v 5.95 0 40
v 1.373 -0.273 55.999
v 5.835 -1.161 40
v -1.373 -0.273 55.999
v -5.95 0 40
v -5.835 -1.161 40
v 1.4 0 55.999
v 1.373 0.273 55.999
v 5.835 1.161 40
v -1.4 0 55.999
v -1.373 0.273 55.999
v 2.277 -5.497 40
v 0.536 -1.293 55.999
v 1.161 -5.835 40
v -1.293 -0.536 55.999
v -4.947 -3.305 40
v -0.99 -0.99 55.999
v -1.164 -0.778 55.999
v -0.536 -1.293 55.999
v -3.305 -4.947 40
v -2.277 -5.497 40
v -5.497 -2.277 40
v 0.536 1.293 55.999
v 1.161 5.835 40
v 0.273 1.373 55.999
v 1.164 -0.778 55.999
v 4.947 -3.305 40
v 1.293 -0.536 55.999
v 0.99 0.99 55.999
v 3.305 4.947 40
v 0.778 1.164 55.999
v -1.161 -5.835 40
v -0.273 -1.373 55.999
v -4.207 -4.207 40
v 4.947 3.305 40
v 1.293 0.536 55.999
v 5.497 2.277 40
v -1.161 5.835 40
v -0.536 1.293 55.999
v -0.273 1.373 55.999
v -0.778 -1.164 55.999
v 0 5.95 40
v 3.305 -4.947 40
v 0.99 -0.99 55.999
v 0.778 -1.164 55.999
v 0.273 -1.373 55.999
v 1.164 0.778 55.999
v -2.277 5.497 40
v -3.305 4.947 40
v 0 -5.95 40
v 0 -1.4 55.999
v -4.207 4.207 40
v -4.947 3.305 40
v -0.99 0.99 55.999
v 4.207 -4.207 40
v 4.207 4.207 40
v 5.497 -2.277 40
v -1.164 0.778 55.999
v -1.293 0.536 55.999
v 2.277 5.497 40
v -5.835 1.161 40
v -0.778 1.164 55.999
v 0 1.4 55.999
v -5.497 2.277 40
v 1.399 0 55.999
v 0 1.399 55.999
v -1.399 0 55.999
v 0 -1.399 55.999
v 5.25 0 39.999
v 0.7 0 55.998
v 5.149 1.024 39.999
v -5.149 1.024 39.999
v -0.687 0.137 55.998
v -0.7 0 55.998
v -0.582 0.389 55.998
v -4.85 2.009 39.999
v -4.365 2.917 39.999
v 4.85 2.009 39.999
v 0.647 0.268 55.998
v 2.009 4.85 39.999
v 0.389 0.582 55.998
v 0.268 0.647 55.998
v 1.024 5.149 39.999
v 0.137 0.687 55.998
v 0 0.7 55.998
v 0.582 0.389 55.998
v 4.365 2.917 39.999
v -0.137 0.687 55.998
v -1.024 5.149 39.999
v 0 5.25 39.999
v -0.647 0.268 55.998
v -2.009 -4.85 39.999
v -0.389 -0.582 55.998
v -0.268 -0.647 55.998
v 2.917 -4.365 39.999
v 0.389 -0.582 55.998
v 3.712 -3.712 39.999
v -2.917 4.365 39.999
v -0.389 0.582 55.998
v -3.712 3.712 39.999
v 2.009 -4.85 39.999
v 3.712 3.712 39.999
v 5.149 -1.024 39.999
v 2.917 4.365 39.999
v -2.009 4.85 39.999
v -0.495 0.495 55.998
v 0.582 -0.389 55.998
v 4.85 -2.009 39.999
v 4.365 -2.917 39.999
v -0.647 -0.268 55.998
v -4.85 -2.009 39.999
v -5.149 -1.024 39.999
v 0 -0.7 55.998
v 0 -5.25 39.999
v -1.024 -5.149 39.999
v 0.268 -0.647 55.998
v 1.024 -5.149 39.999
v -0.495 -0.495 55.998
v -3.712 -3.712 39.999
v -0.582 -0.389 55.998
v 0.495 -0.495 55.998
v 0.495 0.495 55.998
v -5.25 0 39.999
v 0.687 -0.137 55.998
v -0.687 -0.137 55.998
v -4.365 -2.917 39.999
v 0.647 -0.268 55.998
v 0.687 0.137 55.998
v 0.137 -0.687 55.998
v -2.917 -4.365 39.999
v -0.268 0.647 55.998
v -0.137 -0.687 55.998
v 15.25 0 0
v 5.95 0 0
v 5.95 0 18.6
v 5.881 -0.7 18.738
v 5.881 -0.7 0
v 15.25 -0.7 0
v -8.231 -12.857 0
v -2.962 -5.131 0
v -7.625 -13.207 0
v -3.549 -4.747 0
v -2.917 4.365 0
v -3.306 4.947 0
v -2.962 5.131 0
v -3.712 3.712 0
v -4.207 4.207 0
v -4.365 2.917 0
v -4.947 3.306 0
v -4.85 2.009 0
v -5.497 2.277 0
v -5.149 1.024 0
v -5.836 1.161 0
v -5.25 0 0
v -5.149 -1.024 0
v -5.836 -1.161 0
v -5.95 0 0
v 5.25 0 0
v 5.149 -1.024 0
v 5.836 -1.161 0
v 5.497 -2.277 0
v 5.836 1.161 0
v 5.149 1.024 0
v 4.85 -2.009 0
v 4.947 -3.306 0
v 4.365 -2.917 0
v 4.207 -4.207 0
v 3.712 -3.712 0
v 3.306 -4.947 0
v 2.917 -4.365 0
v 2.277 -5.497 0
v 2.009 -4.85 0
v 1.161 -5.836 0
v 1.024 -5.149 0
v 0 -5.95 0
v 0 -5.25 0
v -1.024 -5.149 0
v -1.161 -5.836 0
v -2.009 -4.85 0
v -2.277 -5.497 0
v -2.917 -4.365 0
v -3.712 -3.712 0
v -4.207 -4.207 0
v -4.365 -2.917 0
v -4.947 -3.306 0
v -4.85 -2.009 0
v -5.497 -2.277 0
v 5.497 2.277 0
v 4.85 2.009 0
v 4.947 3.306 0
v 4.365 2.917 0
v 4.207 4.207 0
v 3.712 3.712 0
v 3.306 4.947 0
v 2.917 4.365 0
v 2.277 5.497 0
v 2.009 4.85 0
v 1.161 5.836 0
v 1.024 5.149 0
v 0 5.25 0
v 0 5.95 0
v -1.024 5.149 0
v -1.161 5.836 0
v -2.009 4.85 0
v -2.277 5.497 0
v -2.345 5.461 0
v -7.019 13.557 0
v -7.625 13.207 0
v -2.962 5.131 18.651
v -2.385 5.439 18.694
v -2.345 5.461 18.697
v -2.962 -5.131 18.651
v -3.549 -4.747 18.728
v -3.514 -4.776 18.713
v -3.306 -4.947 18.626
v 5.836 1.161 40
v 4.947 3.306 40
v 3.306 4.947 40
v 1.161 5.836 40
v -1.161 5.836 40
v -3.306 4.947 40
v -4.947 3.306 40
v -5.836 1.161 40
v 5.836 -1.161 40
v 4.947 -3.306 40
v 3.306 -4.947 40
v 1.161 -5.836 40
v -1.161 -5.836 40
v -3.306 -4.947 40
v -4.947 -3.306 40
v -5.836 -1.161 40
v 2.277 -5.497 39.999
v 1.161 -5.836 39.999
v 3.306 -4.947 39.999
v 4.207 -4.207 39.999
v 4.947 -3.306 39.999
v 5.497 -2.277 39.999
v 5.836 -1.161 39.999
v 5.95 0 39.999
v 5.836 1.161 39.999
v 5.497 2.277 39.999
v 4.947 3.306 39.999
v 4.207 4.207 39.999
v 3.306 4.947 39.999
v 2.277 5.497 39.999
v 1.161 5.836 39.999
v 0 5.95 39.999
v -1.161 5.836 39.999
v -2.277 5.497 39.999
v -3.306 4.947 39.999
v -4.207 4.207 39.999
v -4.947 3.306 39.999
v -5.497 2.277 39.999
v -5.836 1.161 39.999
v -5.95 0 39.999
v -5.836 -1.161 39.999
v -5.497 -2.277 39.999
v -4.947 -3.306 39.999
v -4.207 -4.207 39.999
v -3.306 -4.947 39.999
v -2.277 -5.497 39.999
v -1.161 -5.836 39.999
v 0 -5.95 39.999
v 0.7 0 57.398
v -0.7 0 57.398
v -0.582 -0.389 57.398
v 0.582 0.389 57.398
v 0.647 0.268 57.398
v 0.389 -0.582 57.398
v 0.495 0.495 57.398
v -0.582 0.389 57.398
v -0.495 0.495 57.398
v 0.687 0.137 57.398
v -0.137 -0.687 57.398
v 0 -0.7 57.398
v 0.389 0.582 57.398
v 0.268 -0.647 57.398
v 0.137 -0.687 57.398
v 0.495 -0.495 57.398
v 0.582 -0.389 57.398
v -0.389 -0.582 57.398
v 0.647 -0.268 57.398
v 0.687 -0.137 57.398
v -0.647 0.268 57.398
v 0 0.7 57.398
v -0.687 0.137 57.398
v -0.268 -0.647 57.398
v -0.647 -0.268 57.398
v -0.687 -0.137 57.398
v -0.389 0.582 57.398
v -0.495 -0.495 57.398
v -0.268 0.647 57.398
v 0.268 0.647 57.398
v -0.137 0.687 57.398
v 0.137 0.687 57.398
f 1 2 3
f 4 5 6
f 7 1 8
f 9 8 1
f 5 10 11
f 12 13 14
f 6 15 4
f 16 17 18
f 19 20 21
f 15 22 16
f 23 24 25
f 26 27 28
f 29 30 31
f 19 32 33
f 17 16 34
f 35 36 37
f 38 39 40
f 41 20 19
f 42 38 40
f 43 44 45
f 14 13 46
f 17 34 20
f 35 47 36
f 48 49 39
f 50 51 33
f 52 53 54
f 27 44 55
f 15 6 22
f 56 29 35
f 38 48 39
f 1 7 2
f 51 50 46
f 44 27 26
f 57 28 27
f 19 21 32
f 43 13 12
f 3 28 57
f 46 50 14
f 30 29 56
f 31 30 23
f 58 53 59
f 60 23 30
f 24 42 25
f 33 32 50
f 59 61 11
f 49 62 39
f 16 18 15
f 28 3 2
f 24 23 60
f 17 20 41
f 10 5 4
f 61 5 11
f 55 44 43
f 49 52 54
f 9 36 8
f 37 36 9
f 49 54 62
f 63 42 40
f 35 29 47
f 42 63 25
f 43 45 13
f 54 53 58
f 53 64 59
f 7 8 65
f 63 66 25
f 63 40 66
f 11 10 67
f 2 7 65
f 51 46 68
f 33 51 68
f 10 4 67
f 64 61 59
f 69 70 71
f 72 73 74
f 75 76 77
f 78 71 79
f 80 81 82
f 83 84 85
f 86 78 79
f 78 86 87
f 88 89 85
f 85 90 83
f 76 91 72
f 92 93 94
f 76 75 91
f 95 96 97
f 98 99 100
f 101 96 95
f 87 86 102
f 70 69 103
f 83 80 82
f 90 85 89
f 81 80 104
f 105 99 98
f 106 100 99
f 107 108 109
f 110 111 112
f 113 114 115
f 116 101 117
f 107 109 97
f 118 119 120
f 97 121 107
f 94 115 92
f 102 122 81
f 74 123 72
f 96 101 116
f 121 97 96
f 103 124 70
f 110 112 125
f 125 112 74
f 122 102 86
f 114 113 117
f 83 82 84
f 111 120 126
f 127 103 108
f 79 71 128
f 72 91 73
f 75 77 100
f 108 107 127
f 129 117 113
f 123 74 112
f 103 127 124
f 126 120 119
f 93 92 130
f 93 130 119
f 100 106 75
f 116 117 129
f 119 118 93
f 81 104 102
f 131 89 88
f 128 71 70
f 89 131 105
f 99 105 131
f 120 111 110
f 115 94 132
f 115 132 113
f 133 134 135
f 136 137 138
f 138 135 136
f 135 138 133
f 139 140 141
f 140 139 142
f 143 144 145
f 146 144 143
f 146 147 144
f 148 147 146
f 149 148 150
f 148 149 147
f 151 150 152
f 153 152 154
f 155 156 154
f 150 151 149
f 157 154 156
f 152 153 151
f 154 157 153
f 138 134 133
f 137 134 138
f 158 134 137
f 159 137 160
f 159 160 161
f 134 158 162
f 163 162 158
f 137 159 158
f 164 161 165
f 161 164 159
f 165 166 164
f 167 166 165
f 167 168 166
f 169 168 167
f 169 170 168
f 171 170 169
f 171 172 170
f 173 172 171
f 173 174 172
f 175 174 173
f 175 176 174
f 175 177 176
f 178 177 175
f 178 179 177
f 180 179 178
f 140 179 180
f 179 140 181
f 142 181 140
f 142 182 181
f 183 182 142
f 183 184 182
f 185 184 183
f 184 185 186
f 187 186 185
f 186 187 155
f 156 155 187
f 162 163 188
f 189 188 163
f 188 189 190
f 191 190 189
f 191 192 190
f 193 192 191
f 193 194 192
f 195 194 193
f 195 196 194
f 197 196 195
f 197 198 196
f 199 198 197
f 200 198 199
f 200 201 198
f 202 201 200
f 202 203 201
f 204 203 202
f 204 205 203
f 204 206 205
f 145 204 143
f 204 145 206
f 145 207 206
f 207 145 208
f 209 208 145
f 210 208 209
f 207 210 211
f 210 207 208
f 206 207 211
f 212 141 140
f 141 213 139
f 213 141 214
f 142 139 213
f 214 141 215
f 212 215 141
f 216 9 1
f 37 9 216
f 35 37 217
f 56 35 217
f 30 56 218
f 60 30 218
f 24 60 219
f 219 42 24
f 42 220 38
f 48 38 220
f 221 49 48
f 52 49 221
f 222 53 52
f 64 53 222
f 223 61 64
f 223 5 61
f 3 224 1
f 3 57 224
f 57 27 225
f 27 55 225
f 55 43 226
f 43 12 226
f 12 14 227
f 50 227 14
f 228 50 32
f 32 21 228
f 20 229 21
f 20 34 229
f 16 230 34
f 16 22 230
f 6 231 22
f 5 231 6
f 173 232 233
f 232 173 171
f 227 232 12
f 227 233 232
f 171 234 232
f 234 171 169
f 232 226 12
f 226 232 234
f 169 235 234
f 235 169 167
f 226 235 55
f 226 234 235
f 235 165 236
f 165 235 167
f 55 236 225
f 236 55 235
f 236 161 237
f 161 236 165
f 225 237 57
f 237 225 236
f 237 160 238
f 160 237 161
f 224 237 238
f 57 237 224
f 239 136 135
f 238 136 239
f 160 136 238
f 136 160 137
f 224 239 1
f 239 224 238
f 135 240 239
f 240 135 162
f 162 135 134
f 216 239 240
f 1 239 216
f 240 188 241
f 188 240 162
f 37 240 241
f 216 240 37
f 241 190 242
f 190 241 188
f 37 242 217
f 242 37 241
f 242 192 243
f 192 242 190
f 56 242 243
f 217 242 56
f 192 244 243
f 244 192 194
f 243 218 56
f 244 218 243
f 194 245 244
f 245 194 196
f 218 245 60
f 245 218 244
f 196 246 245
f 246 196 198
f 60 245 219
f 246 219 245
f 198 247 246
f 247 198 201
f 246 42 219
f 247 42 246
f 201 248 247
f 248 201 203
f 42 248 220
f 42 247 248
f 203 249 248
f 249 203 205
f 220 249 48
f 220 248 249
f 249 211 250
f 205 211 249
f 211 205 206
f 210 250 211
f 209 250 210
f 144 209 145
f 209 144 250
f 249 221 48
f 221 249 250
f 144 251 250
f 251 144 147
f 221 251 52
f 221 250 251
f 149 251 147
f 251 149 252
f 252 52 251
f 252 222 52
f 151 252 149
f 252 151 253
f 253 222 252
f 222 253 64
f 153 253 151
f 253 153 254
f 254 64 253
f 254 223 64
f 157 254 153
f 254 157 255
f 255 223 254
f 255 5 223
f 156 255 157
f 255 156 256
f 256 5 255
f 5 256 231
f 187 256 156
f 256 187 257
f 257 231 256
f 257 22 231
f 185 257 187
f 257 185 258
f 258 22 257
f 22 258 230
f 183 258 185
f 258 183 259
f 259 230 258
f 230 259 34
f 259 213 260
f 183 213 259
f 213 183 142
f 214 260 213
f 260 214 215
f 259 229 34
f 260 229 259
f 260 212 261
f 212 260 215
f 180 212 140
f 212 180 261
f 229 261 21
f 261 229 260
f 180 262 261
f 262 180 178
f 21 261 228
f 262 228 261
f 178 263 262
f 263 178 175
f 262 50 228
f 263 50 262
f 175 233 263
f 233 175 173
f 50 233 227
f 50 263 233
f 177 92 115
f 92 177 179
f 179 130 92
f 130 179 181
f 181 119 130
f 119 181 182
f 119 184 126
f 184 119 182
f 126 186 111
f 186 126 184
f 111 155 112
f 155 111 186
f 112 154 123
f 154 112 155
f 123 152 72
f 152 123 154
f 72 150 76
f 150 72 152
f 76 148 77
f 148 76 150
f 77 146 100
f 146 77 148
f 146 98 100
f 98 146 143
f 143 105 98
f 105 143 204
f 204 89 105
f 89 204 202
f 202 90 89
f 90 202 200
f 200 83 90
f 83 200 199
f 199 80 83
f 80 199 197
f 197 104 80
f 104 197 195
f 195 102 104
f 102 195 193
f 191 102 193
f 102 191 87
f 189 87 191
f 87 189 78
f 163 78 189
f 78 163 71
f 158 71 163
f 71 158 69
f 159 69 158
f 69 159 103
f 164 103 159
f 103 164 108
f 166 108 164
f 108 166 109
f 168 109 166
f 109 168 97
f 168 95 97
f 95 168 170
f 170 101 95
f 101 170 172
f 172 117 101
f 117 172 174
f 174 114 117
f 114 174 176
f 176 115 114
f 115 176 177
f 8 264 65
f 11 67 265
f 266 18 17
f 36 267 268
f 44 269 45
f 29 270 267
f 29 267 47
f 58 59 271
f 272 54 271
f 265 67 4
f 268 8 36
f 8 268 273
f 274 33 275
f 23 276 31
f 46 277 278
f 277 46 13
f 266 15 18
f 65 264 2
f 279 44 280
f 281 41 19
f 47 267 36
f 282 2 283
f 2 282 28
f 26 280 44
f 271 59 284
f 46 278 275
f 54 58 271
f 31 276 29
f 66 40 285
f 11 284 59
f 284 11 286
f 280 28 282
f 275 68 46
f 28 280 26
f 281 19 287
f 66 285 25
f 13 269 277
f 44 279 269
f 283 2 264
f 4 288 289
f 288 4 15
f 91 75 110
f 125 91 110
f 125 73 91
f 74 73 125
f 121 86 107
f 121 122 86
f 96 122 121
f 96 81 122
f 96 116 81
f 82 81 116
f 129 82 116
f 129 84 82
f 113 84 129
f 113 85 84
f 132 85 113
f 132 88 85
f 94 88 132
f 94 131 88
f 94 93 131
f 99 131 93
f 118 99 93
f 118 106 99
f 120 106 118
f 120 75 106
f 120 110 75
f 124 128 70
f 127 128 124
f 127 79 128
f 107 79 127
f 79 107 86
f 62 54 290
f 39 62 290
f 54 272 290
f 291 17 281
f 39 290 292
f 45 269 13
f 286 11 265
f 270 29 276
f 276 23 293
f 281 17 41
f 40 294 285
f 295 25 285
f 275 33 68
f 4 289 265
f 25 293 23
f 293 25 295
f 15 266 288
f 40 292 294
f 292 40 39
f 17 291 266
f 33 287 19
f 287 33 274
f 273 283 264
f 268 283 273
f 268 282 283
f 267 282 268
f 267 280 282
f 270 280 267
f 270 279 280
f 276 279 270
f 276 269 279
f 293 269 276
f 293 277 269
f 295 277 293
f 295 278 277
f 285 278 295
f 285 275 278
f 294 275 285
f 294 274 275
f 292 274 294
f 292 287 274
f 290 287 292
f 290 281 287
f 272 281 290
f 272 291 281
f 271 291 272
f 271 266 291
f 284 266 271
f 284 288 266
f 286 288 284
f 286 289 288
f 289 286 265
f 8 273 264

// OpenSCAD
/* [Global] */

/* [Rocket] */

inner_diameter = 10.5;

body_height = 40;  //[10:100]
nose_height = 16; //[2:100]
number_of_fins = 3; //[0:4]
fin_width = 10;  //[2:50]
fin_height = 20;  //[2:100]


/* [Extruder] */
// Width of a single wall/perimeter in mm - adjust to ensure model is sliced correctly
perimeter_width = 0.7;

/* [Hidden] */

// other
eta = 0.001;
perim = perimeter_width;
2perim = 2*perim;



// library functions
module donut(or,ir) {
	difference() {
        circle(or);
    	circle(ir);
    }
}


// rocket functions

module rocketBody() {
	$fn=32;
	
	id=inner_diameter;
	h1=body_height;
	h2=nose_height;
	
	fins = number_of_fins;
	finW = fin_width;
	finH = fin_height;
	 
	union() {
		// body
		linear_extrude(height = h1)
			donut(id/2 + perim, id/2);
		
		// cone
		translate([0,0,h1-eta])
			difference() {
				cylinder(r1=id/2 + perim, r2=2perim, h=h2);
				
				translate([0,0,-eta])
					cylinder(r1=id/2, r2=perim, h=h2);			
			}
			
		// tip
		translate([0,0,h1+h2-2*eta])
			cylinder(r1=2perim, r2=perim, h=2perim);
			
		// fins
		for(i=[0:fins-1])
			rotate([0,0,i*360/fins])
			translate([id/2,0,0])
			rotate([90,0,0])
			linear_extrude(perim)
			polygon(points=[[0,0],[0,finH],[finW,0]]);
	
	}
}


rocketBody();
